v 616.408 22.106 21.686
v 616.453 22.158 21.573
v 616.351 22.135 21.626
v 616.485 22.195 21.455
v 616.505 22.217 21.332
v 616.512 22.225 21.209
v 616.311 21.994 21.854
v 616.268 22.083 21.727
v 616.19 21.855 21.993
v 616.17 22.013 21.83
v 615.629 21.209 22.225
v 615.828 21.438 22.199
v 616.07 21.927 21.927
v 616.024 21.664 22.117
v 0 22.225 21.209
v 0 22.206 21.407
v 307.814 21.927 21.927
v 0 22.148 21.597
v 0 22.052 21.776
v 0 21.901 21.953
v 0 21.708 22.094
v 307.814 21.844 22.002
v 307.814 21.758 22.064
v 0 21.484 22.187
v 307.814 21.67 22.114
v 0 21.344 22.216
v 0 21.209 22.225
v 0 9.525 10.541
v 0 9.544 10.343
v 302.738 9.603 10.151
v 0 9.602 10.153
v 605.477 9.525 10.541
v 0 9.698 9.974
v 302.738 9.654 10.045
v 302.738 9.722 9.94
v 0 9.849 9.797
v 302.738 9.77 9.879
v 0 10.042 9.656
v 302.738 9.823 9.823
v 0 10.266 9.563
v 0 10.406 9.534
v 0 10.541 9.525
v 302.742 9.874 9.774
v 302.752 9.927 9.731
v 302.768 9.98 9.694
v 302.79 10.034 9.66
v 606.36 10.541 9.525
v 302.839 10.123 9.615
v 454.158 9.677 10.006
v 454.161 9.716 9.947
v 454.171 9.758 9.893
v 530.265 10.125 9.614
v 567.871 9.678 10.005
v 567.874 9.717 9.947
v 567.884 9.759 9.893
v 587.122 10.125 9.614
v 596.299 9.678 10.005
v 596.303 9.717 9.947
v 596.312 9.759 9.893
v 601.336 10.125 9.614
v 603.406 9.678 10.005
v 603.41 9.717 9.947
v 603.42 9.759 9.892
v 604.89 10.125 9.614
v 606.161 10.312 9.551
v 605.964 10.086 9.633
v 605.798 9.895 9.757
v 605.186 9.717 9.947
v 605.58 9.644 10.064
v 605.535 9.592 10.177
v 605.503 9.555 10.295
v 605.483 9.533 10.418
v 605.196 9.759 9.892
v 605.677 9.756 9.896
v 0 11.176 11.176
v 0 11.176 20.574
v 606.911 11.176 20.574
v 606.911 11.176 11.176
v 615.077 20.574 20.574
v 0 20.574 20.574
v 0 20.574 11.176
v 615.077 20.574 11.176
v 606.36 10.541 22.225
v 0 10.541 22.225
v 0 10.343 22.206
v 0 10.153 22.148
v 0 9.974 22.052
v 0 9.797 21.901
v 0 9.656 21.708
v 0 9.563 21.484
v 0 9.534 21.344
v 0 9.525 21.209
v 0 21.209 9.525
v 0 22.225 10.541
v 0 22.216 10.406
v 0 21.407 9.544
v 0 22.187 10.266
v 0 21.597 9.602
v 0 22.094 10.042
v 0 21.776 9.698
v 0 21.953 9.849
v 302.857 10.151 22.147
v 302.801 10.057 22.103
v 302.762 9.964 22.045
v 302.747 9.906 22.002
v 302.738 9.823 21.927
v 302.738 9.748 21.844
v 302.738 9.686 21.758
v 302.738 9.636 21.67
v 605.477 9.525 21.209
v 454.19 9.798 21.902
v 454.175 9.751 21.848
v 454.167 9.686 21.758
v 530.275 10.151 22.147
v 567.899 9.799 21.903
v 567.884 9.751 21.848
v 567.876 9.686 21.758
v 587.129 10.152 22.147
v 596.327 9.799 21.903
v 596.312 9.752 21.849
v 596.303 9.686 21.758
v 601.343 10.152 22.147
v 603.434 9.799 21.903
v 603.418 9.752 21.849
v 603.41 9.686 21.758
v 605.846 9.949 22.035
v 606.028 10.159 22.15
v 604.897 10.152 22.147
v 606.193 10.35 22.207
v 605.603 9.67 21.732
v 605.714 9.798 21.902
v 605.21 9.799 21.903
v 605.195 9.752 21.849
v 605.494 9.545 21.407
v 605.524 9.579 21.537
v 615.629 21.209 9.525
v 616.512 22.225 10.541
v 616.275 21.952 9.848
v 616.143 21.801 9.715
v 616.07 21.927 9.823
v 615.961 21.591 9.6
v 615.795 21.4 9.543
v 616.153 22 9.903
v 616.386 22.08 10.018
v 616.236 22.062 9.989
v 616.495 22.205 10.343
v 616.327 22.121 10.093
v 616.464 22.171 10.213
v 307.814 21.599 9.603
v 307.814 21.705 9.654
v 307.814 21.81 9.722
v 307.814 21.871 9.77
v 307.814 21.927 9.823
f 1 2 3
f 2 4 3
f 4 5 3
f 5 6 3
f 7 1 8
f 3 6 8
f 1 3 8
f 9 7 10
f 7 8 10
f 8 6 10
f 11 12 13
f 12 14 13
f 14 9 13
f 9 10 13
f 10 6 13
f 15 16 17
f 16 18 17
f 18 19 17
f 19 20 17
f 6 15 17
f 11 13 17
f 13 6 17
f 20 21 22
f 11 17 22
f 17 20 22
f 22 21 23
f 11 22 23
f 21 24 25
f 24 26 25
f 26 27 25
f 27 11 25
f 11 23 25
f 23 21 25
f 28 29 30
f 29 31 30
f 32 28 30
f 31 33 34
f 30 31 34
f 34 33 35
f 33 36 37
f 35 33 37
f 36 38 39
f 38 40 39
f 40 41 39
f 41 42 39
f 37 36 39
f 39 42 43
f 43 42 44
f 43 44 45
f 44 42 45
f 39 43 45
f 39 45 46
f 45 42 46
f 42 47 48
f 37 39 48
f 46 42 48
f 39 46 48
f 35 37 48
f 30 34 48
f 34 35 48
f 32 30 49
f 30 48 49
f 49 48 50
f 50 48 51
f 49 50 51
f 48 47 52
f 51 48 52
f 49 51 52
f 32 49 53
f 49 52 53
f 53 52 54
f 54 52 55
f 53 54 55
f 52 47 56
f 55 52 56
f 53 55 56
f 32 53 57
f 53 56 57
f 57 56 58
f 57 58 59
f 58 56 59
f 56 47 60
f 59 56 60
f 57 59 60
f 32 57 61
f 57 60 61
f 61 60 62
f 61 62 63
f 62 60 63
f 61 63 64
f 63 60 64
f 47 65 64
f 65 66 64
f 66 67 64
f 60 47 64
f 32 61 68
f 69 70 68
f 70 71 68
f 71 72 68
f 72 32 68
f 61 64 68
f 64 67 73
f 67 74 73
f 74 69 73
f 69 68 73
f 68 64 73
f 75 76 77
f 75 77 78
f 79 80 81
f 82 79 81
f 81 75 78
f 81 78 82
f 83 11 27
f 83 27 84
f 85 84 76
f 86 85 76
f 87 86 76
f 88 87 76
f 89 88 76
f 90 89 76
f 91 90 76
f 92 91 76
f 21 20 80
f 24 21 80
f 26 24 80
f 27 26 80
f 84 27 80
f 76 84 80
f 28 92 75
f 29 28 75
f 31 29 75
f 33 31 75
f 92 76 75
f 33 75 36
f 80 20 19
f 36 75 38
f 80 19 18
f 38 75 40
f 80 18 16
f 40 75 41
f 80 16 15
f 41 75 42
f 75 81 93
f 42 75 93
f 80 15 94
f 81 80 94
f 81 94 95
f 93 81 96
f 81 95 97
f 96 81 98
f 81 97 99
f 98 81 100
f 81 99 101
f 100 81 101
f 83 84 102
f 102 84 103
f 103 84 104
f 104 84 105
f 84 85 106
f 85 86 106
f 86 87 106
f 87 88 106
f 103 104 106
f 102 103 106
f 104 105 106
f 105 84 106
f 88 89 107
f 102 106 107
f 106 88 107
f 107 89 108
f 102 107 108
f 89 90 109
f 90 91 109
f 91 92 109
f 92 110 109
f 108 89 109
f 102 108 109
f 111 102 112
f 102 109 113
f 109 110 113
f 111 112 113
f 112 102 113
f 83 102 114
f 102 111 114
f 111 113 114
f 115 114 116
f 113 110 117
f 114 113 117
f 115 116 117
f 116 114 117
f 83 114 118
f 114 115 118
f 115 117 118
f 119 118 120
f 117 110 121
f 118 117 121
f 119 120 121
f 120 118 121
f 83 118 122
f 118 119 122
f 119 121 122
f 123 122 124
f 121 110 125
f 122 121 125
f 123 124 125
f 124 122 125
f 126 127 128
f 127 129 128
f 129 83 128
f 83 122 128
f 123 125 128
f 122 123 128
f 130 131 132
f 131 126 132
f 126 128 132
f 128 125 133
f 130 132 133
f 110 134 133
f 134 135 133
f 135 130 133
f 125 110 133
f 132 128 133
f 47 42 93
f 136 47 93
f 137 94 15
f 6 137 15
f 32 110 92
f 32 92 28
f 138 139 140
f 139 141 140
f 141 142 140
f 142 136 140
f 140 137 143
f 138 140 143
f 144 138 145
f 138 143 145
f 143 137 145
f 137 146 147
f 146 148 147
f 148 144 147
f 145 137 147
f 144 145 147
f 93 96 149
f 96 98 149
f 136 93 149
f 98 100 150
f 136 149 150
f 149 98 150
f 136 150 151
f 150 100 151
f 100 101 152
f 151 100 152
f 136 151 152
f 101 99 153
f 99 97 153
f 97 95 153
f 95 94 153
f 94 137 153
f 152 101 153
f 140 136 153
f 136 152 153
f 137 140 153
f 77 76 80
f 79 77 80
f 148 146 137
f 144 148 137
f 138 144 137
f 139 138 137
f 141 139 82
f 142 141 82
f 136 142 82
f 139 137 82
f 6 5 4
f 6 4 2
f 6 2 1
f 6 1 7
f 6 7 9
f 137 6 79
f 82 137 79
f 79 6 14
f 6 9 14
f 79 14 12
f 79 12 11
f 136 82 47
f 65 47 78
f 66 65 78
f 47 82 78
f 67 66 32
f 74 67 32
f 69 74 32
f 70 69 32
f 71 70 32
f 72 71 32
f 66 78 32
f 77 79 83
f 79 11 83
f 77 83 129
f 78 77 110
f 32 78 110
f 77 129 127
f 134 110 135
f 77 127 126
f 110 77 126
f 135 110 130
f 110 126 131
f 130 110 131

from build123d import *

# Parameters (mm, degrees)
SKETCH1_W           = 23.495
SKETCH1_H           = 23.495
BOSS_EXTRUDE1_DEPTH = 1320.8
SCALE4_SCALE_X      = 1
SCALE4_SCALE_Y      = 0.4
SCALE4_SCALE_Z      = 0.4
CUT_EXTRUDE2_DEPTH  = 1322.04802369


with BuildPart() as part:
    # Sketch1 → Boss-Extrude1 (new body)
    with BuildSketch(Plane(origin=(0, 0, 0), x_dir=(0, 0, -1), z_dir=(1, 0, 0))):
        with BuildLine():
            Line((0, 2.54), (0, 29.21))
            ThreePointArc((0, 29.21), (-0.743948776, 31.006051224), (-2.54, 31.75))
            Line((-2.54, 31.75), (-29.21, 31.75))
            ThreePointArc((-29.21, 31.75), (-31.006051224, 31.006051224), (-31.75, 29.21))
            Line((-31.75, 29.21), (-31.75, 2.54))
            ThreePointArc((-31.75, 2.54), (-31.006051224, 0.743948776), (-29.21, 0))
            Line((-29.21, 0), (-2.54, 0))
            ThreePointArc((-2.54, 0), (-0.743948776, 0.743948776), (0, 2.54))
        make_face()
        with Locations((-15.875, 15.875)):
            Rectangle(SKETCH1_W, SKETCH1_H, mode=Mode.SUBTRACT)
    extrude(amount=BOSS_EXTRUDE1_DEPTH)


with BuildPart() as part_1:
    # Scale4: scaled about (660.4, 15.875, 15.875)
    add(part.part.scale((SCALE4_SCALE_X, SCALE4_SCALE_Y, SCALE4_SCALE_Z), about=(660.4, 15.875, 15.875)))

    # Sketch8 → Cut-Extrude2 (cut, through all)
    with BuildSketch(Plane.XY.offset(22.225)):
        Polygon((616.511599643, 22.225), (605.47676407, 9.525), (644.192147645, 9.525), (655.226983218, 22.225), align=None)
    extrude(amount=-CUT_EXTRUDE2_DEPTH, mode=Mode.SUBTRACT)


with BuildPart() as body_2:
    # of the pieces the cut leaves, the one that is kept (cut_extrude2_keep)
    add(part_1.part.solids().sort_by_distance((0, 10.541, 9.525))[0])


solid = body_2.part
